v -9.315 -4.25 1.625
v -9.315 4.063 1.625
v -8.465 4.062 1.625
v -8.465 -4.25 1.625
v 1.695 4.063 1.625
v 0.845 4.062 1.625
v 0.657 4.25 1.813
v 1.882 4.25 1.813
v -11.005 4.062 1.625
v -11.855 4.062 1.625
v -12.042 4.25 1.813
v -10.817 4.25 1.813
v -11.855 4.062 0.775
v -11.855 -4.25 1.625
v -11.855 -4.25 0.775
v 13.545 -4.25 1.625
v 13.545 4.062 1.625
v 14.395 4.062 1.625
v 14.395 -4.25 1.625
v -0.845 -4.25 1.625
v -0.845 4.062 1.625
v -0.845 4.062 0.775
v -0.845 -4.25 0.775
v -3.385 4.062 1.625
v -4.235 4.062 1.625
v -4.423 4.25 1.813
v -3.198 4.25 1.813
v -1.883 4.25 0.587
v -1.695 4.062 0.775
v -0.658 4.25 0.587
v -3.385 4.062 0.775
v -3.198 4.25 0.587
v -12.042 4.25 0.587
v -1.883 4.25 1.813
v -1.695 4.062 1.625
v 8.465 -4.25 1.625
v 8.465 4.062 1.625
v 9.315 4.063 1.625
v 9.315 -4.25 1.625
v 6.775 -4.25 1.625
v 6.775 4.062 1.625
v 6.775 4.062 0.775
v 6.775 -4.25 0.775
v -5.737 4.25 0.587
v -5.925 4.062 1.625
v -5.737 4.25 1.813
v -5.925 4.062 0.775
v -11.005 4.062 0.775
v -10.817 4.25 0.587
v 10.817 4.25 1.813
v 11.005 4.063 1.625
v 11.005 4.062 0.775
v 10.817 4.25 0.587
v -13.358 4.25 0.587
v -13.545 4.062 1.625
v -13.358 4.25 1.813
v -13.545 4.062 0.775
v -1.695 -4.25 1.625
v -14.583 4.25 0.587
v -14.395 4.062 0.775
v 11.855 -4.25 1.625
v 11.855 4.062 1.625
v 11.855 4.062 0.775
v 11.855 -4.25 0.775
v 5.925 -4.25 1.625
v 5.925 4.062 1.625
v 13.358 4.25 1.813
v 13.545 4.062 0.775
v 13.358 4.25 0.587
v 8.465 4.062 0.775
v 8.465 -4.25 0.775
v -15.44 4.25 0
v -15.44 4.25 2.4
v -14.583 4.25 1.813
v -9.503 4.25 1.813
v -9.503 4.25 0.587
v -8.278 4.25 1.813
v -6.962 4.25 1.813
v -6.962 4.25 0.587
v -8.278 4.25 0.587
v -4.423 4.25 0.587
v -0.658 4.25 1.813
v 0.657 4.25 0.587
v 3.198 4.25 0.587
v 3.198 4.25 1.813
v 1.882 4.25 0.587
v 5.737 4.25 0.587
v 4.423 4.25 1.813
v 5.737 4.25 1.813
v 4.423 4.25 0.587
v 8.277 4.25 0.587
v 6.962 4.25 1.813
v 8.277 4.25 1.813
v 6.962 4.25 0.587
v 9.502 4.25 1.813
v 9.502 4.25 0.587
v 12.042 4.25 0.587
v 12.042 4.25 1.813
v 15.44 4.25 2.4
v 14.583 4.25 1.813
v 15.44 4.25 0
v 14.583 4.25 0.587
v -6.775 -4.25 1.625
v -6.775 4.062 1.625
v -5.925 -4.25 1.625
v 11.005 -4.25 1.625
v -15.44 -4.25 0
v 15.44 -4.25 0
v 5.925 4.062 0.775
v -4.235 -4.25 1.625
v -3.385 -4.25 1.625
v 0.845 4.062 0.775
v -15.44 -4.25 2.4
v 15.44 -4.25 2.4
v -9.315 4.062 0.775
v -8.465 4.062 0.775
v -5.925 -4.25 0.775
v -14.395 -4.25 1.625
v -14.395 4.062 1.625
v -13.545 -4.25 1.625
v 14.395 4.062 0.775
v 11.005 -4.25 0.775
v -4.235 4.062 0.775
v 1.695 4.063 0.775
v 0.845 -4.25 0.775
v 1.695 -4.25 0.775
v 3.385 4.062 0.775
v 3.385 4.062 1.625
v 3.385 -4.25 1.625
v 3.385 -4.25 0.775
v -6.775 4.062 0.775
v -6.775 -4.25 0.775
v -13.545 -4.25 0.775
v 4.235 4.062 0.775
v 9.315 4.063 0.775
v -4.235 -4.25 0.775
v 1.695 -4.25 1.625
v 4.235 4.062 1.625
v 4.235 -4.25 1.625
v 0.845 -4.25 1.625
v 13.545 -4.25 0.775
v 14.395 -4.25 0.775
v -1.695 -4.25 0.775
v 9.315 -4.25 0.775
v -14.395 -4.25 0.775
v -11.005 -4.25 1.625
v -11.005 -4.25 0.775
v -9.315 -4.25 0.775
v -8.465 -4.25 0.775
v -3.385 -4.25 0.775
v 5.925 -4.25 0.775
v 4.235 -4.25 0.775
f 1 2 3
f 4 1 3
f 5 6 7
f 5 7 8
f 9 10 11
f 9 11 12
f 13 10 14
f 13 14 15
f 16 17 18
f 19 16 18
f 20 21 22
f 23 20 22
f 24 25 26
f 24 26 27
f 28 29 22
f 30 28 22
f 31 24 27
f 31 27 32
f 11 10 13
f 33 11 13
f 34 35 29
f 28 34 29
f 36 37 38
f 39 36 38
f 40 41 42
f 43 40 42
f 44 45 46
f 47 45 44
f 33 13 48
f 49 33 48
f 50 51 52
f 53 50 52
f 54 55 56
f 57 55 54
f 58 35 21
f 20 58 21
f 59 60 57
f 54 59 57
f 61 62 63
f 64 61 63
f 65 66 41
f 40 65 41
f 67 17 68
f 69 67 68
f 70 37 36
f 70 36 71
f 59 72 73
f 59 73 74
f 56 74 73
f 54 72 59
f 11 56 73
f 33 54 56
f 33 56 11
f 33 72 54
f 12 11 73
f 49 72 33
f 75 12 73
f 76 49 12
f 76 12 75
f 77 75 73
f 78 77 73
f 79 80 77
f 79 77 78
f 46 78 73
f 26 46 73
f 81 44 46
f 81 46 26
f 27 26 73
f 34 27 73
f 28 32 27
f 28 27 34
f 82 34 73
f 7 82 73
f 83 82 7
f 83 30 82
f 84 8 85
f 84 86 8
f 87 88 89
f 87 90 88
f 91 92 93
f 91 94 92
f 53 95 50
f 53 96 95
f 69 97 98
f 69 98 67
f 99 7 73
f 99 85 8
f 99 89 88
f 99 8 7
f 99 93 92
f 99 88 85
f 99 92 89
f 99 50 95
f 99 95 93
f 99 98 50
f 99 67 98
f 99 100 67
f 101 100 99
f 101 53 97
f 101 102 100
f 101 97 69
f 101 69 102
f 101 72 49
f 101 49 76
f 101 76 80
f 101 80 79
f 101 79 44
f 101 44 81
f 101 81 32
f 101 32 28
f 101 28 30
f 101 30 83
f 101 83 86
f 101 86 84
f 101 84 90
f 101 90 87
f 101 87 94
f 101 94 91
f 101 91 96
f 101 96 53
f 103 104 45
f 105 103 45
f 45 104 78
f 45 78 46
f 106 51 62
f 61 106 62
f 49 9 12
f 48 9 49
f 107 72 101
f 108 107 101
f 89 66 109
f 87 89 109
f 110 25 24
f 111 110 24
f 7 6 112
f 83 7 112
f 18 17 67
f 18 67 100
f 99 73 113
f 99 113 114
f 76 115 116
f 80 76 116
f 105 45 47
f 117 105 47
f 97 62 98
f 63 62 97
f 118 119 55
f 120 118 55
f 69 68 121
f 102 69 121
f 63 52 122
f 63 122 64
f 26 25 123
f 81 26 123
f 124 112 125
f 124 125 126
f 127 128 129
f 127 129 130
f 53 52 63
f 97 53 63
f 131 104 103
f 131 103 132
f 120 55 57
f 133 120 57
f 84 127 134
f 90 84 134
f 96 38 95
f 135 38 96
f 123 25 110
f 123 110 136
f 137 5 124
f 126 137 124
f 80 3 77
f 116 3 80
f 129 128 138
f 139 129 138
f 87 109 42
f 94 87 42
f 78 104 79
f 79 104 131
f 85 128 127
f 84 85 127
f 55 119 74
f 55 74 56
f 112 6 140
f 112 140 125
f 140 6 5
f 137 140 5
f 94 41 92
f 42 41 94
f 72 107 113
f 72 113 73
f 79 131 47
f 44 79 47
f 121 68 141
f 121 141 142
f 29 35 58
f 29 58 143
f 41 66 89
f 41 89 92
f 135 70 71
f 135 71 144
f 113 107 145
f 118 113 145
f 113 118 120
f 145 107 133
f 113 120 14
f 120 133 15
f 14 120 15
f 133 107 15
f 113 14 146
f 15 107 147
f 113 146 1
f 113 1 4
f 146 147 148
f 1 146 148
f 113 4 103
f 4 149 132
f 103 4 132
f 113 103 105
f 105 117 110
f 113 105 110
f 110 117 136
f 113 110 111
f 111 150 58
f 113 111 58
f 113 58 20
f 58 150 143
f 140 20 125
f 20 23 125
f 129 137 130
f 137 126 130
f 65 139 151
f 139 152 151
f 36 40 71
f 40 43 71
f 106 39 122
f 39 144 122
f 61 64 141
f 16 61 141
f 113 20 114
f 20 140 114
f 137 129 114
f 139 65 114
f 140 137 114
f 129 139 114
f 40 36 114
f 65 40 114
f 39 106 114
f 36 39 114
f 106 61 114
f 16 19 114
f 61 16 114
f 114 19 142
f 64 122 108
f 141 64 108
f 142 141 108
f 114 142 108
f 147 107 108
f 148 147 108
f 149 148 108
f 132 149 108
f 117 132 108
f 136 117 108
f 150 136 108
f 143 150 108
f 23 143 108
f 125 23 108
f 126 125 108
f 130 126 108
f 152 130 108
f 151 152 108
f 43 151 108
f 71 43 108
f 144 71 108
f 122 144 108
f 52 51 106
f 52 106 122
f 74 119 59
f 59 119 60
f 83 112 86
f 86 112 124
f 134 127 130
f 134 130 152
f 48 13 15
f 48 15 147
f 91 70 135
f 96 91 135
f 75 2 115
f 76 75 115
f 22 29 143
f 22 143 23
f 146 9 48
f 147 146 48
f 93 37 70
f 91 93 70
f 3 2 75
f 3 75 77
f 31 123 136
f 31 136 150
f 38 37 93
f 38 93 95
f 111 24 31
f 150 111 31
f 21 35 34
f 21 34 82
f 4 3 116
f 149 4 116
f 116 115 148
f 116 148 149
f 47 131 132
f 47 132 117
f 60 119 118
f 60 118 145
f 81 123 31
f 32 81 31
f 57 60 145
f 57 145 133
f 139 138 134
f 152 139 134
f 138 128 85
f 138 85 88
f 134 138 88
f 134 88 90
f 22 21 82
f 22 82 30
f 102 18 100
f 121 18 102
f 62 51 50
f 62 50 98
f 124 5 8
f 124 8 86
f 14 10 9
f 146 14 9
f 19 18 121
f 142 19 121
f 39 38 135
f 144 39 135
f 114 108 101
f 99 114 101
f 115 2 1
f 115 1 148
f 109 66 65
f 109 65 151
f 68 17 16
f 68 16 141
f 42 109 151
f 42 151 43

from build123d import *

# Parameters (mm, degrees)
SKETCH1_W                  = 30.88
SKETCH1_H                  = 8.5
BOSS_EXTRUDE1_DEPTH        = 2.4
SKETCH2_W                  = 0.85
SKETCH2_H                  = 0.85
CUT_EXTRUDE1_DEPTH         = 18.787737349
CHAMFER1_SIZE              = 0.1875
LPATTERN1_COUNT            = 12
LPATTERN1_PITCH            = 2.54
CHAMFER1_OF_LPATTERN1_SIZE = 0.1875


with BuildPart() as part:
    # Sketch1 → Boss-Extrude1 (new body)
    with BuildSketch(Plane.XY):
        Rectangle(SKETCH1_W, SKETCH1_H)
    extrude(amount=BOSS_EXTRUDE1_DEPTH)

    # Sketch2 → Cut-Extrude1 (cut, through all)
    with BuildSketch(Plane(origin=(0, 4.25, 0), x_dir=(1, 0, 0), z_dir=(0, 1, 0))):
        with Locations((-13.97, -1.2)):
            Rectangle(SKETCH2_W, SKETCH2_H)
    cut_extrude1 = extrude(amount=-CUT_EXTRUDE1_DEPTH, mode=Mode.SUBTRACT)

    # Chamfer1
    chamfer1_edges = [part.edges().sort_by_distance(p)[0] for p in [
        (-13.545, 4.25, 1.2),
        (-13.97, 4.25, 0.775),
        (-14.395, 4.25, 1.2),
        (-13.97, 4.25, 1.625),
    ]]
    chamfer(chamfer1_edges, length=CHAMFER1_SIZE)

    # LPattern1: Cut-Extrude1 ×12
    with Locations(*[(i * LPATTERN1_PITCH, 0, 0) for i in range(1, LPATTERN1_COUNT)]):
        add(cut_extrude1, mode=Mode.SUBTRACT)

    # Chamfer1 of LPattern1
    chamfer1_of_lpattern1_edges = [part.edges().sort_by_distance(p)[0] for p in [
        (-11.005, 4.25, 1.2),
        (-11.43, 4.25, 0.775),
        (-11.855, 4.25, 1.2),
        (-11.43, 4.25, 1.625),
        (-8.465, 4.25, 1.2),
        (-8.89, 4.25, 0.775),
        (-9.315, 4.25, 1.2),
        (-8.89, 4.25, 1.625),
        (-5.925, 4.25, 1.2),
        (-6.35, 4.25, 0.775),
        (-6.775, 4.25, 1.2),
        (-6.35, 4.25, 1.625),
        (-3.385, 4.25, 1.2),
        (-3.81, 4.25, 0.775),
        (-4.235, 4.25, 1.2),
        (-3.81, 4.25, 1.625),
        (-0.845, 4.25, 1.2),
        (-1.27, 4.25, 0.775),
        (-1.695, 4.25, 1.2),
        (-1.27, 4.25, 1.625),
        (1.695, 4.25, 1.2),
        (1.27, 4.25, 0.775),
        (0.845, 4.25, 1.2),
        (1.27, 4.25, 1.625),
        (4.235, 4.25, 1.2),
        (3.81, 4.25, 0.775),
        (3.385, 4.25, 1.2),
        (3.81, 4.25, 1.625),
        (6.775, 4.25, 1.2),
        (6.35, 4.25, 0.775),
        (5.925, 4.25, 1.2),
        (6.35, 4.25, 1.625),
        (9.315, 4.25, 1.2),
        (8.89, 4.25, 0.775),
        (8.465, 4.25, 1.2),
        (8.89, 4.25, 1.625),
        (11.855, 4.25, 1.2),
        (11.43, 4.25, 0.775),
        (11.005, 4.25, 1.2),
        (11.43, 4.25, 1.625),
        (14.395, 4.25, 1.2),
        (13.97, 4.25, 0.775),
        (13.545, 4.25, 1.2),
        (13.97, 4.25, 1.625),
    ]]
    chamfer(chamfer1_of_lpattern1_edges, length=CHAMFER1_OF_LPATTERN1_SIZE)


solid = part.part
